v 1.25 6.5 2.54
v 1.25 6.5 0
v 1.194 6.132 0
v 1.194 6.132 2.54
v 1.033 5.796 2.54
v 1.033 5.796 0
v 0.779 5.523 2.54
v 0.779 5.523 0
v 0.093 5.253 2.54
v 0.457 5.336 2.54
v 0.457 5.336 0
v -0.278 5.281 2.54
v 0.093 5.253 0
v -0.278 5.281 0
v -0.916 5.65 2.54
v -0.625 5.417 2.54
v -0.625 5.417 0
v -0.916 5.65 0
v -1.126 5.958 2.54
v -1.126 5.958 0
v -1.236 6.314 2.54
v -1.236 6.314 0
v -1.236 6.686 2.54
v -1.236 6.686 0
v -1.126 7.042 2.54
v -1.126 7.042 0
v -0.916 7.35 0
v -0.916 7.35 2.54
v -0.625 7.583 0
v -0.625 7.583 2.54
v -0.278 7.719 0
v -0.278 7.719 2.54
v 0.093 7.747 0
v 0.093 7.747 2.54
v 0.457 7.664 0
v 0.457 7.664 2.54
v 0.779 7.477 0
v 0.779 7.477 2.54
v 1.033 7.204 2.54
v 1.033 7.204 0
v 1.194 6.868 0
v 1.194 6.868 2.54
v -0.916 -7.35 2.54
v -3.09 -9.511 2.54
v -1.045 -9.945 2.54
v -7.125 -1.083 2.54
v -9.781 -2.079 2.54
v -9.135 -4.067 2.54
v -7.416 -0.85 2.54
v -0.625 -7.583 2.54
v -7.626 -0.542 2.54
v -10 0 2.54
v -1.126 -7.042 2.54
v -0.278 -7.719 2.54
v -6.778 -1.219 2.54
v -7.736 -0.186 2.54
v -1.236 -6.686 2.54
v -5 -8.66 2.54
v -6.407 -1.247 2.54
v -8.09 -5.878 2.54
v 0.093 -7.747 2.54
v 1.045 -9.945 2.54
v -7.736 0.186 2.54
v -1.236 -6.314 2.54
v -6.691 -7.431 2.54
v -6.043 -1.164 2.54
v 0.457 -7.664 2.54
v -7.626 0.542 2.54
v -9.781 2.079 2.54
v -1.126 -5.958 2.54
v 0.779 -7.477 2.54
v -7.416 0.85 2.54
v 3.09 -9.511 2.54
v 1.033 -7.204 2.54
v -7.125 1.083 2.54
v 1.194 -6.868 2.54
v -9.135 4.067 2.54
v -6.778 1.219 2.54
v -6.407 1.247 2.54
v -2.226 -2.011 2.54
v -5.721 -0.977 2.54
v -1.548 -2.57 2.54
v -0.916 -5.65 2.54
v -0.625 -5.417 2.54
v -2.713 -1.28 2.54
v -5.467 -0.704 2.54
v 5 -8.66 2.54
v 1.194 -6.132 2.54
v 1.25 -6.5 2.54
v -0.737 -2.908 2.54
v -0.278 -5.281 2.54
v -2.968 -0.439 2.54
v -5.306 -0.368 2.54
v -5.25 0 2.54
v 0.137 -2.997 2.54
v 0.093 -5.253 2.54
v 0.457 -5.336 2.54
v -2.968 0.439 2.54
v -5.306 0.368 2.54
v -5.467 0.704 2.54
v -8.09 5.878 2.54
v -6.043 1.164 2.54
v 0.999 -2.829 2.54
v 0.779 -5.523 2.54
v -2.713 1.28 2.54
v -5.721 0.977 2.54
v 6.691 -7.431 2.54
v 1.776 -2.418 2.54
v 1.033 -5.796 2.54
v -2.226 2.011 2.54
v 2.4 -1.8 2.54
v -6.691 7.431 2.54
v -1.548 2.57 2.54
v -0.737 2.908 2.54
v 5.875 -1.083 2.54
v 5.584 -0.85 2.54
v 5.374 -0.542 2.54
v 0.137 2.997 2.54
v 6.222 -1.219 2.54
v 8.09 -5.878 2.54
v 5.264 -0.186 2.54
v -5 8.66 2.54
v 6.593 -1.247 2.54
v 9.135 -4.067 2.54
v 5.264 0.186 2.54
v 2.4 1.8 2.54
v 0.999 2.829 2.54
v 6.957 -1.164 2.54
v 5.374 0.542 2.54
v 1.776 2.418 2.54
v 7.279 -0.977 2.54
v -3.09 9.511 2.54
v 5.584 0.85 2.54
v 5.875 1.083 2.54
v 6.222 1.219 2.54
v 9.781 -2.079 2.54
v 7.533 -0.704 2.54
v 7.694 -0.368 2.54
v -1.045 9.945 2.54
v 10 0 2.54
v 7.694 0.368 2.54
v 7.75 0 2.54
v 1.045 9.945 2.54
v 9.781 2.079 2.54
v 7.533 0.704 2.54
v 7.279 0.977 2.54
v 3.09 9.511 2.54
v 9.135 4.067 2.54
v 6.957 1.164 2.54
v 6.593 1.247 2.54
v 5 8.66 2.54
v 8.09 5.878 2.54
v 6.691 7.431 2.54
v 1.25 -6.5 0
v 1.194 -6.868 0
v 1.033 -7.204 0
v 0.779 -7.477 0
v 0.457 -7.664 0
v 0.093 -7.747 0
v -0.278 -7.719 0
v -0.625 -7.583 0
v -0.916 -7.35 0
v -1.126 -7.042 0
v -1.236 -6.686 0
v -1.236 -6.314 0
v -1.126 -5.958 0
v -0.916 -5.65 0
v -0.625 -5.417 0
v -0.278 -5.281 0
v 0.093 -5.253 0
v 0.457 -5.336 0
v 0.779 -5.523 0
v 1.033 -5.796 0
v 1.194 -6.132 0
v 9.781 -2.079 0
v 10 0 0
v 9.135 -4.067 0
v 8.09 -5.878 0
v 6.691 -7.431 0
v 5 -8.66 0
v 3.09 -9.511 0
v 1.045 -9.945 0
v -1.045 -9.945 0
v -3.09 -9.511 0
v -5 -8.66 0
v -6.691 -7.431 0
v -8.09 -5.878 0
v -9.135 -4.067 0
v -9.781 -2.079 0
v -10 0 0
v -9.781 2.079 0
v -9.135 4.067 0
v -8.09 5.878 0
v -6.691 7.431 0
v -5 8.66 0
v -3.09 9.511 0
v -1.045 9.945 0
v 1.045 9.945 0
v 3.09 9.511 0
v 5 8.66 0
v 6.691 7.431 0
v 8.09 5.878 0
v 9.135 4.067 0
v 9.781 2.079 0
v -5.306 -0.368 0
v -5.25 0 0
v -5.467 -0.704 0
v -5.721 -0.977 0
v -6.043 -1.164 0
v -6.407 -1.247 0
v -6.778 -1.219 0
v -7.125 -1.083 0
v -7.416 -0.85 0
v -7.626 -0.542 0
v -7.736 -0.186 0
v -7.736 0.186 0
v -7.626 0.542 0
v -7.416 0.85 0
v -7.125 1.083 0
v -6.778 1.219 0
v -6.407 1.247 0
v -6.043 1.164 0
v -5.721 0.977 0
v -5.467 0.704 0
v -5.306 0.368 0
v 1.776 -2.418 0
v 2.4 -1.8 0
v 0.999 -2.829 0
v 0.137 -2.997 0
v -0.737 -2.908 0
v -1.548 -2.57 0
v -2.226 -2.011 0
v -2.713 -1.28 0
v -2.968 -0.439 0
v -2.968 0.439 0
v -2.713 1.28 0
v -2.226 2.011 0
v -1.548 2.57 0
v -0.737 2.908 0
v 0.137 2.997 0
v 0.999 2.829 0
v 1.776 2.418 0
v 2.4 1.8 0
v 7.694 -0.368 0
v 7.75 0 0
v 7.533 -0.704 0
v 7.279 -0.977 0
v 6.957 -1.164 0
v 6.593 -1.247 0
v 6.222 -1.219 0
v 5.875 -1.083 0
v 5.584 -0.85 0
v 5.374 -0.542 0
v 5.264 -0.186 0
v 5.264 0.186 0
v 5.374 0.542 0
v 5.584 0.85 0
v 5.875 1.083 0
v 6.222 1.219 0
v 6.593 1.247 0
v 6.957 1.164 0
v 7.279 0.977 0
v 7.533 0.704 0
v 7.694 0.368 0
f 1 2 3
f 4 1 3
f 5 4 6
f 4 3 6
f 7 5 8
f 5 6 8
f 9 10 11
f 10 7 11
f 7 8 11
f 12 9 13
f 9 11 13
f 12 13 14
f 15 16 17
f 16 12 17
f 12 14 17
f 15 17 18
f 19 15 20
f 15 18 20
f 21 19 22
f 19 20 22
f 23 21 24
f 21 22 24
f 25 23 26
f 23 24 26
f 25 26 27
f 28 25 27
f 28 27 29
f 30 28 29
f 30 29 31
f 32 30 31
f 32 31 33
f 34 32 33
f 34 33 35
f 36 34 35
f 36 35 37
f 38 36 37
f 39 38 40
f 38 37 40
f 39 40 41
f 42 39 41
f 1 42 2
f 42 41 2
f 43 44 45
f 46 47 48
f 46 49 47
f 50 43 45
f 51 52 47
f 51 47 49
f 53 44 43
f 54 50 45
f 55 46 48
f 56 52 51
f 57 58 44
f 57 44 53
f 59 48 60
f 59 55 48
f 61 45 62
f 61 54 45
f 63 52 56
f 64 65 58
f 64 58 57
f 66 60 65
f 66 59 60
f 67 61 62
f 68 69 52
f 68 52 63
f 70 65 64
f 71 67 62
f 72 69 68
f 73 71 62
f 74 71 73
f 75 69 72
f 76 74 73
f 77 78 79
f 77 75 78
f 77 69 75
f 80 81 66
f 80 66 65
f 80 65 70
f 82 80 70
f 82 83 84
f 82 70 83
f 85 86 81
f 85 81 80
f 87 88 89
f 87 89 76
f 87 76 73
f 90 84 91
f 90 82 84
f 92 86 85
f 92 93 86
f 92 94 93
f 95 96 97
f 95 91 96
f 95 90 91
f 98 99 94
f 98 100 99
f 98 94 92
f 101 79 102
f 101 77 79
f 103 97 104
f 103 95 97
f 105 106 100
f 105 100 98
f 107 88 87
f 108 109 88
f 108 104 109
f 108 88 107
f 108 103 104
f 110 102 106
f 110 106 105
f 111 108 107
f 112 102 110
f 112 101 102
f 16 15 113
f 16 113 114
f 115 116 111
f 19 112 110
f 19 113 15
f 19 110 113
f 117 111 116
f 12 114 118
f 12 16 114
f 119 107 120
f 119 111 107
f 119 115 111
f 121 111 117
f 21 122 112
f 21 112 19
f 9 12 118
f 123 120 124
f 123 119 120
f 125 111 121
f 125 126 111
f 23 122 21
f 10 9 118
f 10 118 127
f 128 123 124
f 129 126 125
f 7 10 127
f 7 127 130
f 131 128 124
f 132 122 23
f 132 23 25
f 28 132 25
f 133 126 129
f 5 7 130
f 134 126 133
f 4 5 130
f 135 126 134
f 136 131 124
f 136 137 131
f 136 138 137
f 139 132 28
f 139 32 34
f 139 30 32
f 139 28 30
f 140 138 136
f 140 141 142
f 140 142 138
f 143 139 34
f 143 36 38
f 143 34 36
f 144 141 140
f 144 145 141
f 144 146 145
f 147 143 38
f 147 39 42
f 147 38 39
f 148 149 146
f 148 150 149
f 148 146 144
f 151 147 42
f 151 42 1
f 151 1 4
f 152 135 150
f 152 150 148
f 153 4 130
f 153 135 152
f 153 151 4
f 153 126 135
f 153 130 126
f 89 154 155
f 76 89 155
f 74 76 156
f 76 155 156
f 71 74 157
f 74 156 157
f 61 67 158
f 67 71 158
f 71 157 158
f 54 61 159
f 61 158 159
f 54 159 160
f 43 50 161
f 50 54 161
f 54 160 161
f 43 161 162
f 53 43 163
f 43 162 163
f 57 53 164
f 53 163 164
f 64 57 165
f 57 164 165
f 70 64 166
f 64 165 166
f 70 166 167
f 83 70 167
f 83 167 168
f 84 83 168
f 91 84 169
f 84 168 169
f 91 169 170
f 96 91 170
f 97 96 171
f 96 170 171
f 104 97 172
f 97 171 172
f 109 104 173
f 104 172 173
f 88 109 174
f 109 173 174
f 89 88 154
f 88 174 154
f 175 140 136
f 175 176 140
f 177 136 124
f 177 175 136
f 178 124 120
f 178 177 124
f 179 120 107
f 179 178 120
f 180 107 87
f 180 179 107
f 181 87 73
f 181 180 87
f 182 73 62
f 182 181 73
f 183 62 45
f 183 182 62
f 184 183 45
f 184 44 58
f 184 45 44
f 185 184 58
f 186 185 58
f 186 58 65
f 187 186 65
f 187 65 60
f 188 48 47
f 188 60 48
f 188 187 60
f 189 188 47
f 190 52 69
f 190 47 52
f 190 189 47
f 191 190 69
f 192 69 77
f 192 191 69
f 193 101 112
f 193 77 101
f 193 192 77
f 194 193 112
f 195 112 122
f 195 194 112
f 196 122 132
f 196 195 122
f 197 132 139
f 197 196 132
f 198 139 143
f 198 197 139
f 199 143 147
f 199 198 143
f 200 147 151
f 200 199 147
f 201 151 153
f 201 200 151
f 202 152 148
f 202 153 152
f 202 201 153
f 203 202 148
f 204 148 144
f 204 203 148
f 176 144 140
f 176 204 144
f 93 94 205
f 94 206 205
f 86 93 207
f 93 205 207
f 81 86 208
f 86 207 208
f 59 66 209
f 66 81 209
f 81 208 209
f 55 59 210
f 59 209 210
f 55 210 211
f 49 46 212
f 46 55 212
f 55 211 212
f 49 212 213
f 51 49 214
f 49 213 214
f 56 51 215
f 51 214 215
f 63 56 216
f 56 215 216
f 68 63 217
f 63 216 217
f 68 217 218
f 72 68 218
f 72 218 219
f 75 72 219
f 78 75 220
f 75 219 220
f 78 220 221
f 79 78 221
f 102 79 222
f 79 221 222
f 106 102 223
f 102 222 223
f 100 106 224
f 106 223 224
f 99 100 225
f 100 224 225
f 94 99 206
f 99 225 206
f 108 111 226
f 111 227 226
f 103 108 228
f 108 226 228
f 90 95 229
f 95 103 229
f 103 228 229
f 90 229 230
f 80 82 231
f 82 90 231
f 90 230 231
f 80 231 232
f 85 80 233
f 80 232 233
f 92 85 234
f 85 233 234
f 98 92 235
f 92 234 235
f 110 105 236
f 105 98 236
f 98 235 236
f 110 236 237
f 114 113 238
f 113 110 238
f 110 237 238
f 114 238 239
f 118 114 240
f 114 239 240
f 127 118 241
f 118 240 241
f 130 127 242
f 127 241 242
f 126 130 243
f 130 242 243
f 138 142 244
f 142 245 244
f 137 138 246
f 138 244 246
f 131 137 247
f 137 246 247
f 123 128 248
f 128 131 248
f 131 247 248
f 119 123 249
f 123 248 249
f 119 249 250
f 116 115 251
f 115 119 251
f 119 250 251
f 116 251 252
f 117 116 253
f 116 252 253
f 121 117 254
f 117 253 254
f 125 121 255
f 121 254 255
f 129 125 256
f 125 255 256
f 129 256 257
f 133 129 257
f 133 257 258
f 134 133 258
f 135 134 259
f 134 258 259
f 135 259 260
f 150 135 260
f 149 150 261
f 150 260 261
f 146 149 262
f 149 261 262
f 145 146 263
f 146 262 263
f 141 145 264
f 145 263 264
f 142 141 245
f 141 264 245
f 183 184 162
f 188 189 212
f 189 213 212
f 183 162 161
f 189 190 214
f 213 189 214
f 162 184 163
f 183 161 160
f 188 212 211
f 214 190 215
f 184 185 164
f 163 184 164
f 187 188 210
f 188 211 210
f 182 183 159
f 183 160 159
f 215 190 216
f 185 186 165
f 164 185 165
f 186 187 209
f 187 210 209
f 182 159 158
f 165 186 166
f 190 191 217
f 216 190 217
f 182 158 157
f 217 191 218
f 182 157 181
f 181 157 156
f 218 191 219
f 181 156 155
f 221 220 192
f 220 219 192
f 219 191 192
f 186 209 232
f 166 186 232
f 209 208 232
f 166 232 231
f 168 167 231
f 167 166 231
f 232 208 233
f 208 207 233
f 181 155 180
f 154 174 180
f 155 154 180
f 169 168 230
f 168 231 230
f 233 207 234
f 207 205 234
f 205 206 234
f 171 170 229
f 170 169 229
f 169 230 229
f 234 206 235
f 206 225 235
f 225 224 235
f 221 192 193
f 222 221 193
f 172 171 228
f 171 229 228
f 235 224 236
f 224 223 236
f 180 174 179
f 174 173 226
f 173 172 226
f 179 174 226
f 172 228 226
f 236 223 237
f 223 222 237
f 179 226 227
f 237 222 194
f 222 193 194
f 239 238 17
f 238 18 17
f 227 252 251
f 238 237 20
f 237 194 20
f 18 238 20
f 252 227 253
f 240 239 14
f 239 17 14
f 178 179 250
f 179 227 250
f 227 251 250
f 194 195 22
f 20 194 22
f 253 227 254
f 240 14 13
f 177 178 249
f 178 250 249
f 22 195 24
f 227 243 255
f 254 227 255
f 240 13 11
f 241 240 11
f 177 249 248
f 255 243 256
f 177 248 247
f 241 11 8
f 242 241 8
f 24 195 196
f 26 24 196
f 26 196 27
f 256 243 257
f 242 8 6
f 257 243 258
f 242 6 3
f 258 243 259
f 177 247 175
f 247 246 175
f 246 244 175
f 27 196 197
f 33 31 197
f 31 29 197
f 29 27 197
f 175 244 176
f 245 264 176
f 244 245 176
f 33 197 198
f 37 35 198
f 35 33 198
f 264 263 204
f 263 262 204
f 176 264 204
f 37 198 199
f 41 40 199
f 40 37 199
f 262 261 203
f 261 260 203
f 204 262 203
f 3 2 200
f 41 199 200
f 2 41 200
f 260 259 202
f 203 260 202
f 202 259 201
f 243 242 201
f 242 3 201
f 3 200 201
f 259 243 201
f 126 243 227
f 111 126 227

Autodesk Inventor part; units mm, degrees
ref_plane "YZ Plane" through (0, 0, 0) normal (1, 0, 0) x (0, 1, 0)
ref_plane "XZ Plane" through (0, 0, 0) normal (0, 1, 0) x (-1, 0, 0)
ref_plane "XY Plane" through (0, 0, 0) normal (0, 0, 1) x (1, 0, 0)
sketch "Sketch1" plane through (0, 0, 0) normal (0, 0, 1) x (1, 0, 0)
  circle A0 centre (0, 0) radius 10
  arc A1 (2.4, 1.8) -> (2.4, -1.8) centre (0, 0) ccw
  line L0 (-10, 0) -> (10, 0) construction
  line L1 (0, 10) -> (0, -10) construction
  circle A2 centre (0, 0) radius 6.5 construction
  circle A3 centre (-6.5, 0) radius 1.25
  circle A4 centre (0, 6.5) radius 1.25
  circle A5 centre (0, -6.5) radius 1.25
  circle A6 centre (6.5, 0) radius 1.25
  line L2 (-3, 0) -> (0, 0) construction
  line L3 (2.4, 1.8) -> (2.4, -1.8)
  arc A7 (3, 0) -> (2.4, 1.8) centre (0, 0) ccw construction
  arc A8 (2.4, -1.8) -> (3, 0) centre (0, 0) ccw construction
  dimension "d0" = 6
  dimension "d1" = 20
  dimension "d3" = 3.5
  dimension "d4" = 2.5
  dimension "d7" = 5.4
extrude "Plate1" add sketch "Sketch1" along normal blind 2.54
equation "\"d8\" = Thickness"
equation "\"BendRadius\" = Thickness"
equation "\"BendReliefWidth\" = Thickness"
equation "\"BendReliefDepth\" = 0.5 * Thickness"
equation "\"CornerReliefSize\" = 4 * Thickness"
equation "\"MinimumRemnant\" = 2 * Thickness"
equation "\"TransitionRadius\" = BendRadius"
equation "\"JacobiRadiusSize\" = BendRadius"
equation "\"GapSize\" = Thickness"
equation "\"Thickness\" = 2.54"
properties part number "ForearmDHub"
